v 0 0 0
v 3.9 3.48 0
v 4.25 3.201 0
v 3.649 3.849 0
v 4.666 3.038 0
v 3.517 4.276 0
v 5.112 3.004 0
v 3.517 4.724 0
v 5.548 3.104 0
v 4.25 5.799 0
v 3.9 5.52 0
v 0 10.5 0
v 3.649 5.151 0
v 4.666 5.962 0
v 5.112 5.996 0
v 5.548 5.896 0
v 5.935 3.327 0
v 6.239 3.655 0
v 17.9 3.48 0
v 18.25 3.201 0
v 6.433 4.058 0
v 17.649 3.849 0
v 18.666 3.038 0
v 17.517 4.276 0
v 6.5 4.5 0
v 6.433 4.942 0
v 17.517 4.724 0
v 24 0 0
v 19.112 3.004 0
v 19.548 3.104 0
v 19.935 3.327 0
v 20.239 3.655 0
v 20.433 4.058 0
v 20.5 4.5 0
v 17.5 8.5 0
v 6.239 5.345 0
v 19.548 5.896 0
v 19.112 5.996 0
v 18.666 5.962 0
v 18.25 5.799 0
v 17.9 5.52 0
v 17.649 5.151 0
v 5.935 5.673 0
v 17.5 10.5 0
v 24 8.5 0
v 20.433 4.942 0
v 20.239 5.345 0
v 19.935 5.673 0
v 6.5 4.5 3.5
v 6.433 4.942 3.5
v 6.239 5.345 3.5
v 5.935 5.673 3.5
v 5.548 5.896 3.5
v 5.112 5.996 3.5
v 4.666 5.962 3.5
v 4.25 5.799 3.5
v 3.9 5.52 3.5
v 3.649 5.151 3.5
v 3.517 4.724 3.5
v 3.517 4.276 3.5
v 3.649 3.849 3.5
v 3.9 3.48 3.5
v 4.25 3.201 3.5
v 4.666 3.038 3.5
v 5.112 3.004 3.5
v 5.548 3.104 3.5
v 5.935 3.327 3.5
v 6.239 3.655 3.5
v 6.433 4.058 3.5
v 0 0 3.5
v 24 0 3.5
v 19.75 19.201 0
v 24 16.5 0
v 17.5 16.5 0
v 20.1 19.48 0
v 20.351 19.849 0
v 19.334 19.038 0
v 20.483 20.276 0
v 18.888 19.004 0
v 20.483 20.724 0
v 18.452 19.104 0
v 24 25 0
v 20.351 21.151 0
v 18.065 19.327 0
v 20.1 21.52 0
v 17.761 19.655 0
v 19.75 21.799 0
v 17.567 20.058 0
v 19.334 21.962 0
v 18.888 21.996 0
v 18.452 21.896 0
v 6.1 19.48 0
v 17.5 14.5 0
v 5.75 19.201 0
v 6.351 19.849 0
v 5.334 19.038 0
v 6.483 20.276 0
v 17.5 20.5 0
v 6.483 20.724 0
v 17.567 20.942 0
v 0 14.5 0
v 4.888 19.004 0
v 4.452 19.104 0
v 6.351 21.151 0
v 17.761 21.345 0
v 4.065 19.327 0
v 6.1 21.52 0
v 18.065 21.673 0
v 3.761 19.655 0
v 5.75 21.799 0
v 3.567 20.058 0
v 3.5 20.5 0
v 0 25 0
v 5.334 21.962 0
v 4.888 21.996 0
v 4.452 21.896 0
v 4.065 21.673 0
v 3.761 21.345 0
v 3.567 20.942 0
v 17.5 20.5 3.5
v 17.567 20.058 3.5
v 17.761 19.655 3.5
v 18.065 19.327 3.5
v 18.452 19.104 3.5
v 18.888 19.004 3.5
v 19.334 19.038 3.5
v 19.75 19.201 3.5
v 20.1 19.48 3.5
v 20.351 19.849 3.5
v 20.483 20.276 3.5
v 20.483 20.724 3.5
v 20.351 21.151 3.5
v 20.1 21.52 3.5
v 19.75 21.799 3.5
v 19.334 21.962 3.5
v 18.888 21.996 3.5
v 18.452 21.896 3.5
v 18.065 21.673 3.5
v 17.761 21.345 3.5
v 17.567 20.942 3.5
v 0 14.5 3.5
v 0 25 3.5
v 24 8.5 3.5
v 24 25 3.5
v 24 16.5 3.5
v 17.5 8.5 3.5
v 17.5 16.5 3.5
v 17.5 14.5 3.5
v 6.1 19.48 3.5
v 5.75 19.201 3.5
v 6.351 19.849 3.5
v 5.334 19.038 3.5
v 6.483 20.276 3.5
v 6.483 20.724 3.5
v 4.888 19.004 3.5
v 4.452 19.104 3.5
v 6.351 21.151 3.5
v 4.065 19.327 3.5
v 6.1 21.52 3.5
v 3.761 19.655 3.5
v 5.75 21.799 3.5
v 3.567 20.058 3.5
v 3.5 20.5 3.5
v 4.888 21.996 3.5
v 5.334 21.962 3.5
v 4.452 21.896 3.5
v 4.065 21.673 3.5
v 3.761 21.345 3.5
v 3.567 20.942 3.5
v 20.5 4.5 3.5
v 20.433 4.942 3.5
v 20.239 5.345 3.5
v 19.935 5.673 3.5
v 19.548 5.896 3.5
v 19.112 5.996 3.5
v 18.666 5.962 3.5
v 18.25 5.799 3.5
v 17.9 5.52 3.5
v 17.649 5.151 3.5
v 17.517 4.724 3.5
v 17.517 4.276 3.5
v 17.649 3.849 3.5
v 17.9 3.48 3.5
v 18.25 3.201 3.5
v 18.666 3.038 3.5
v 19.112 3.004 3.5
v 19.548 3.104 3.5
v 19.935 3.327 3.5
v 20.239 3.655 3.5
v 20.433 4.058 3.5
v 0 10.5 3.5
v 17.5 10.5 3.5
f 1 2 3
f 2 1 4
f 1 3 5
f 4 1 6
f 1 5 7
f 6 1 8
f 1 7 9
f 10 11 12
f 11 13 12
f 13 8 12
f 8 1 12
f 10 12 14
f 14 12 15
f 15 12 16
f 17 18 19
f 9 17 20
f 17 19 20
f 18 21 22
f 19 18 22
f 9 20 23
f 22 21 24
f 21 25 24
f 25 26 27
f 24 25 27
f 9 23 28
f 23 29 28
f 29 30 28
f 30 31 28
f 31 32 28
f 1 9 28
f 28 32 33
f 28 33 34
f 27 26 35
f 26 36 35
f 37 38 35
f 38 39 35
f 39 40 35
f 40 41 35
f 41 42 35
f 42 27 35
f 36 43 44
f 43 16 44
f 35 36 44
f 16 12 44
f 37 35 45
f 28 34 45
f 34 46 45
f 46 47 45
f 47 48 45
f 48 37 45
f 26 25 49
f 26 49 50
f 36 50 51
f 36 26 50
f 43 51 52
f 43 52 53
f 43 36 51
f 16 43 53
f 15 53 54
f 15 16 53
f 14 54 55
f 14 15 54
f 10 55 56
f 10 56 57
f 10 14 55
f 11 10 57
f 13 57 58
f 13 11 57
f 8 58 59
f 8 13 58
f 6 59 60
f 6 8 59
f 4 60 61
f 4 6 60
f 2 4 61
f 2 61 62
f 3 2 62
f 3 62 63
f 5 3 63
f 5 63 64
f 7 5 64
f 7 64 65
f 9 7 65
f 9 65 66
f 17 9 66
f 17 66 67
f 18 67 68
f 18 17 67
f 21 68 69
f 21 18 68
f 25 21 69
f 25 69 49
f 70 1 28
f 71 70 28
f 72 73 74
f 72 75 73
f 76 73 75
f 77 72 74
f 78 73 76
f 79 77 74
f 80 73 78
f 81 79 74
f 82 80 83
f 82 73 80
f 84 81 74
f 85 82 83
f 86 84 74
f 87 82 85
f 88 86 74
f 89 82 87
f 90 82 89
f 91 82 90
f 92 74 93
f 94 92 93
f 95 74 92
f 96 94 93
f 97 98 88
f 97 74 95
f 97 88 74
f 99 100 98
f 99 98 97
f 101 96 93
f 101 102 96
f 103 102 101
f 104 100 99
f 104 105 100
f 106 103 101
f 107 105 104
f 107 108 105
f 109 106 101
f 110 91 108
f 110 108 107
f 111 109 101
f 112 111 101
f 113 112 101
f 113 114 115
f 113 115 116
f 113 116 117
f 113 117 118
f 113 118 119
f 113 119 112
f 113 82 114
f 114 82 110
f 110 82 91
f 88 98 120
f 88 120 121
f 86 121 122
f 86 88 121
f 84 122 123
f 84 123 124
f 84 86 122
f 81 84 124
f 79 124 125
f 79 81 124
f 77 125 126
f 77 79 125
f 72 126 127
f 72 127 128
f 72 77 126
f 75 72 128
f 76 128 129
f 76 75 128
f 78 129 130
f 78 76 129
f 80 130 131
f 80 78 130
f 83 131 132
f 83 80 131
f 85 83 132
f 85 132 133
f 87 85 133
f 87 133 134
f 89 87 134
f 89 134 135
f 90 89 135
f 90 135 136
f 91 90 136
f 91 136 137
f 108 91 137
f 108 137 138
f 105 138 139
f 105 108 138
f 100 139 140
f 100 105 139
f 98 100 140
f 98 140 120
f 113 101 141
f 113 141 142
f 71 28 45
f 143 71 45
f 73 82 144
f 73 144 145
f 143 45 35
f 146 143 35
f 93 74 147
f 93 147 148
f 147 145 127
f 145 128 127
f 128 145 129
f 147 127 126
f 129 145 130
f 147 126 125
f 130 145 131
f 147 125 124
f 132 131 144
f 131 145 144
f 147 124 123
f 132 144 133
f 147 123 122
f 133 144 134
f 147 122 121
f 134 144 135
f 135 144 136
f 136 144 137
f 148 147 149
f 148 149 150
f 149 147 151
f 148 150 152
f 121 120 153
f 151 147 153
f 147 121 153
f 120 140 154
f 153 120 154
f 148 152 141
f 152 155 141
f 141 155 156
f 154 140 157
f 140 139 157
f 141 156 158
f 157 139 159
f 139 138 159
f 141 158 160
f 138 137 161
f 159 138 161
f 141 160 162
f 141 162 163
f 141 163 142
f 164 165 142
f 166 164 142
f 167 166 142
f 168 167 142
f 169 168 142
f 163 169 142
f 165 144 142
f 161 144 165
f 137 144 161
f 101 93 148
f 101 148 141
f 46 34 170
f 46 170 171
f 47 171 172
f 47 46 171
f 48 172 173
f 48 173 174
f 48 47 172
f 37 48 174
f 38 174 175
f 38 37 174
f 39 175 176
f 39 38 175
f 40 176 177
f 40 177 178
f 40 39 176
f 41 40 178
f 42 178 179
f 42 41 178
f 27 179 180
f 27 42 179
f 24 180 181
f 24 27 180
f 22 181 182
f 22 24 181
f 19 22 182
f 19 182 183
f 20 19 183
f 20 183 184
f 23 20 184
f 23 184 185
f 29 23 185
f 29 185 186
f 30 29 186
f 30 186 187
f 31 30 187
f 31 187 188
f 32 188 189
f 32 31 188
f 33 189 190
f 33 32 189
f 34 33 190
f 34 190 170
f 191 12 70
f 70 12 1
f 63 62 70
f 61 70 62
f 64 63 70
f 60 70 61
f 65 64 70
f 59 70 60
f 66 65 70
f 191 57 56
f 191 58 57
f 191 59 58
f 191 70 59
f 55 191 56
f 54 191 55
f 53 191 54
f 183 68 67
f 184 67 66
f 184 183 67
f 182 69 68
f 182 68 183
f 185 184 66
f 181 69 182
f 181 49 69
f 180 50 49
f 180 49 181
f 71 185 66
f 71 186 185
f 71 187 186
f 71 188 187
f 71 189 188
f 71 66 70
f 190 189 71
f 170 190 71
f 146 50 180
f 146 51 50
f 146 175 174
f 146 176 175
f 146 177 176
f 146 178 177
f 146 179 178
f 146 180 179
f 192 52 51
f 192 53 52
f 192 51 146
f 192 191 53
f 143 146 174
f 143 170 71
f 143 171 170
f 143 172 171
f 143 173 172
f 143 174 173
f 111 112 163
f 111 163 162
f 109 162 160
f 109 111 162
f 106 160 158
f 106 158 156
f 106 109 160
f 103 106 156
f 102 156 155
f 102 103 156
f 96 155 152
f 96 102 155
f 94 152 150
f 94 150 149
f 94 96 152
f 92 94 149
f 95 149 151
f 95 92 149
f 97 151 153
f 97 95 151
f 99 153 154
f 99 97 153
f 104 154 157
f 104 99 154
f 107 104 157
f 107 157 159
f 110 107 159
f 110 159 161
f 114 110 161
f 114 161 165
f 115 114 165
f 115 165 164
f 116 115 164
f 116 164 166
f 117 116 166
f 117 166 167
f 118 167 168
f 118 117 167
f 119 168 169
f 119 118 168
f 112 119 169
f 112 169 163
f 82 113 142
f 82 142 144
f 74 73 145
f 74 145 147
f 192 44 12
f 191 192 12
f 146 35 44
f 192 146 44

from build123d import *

# Parameters (mm, degrees)
CROQUIS1_R                = 1.5
SALIENTE_EXTRUIR1_DEPTH   = 3.5
SALIENTE_EXTRUIR1_2_DEPTH = 3.5


with BuildPart() as part:
    # Croquis1 → Saliente-Extruir1 (new body)
    with BuildSketch(Plane.XY):
        Polygon((17.5, 8.5), (17.5, 10.5), (0, 10.5), (0, 0), (24, 0), (24, 8.5), align=None)
        with Locations((5, 4.5)):
            Circle(CROQUIS1_R, mode=Mode.SUBTRACT)
        with Locations((19, 4.5)):
            Circle(CROQUIS1_R, mode=Mode.SUBTRACT)
    extrude(amount=SALIENTE_EXTRUIR1_DEPTH)


with BuildPart() as body_2:
    # Croquis1 → Saliente-Extruir1 2 (new body)
    with BuildSketch(Plane.XY):
        Polygon((0, 14.5), (0, 25), (24, 25), (24, 16.5), (17.5, 16.5), (17.5, 14.5), align=None)
        with Locations(Location((19, 20.5, 0), (0, 0, 180))):
            Circle(CROQUIS1_R, mode=Mode.SUBTRACT)
        with Locations(Location((5, 20.5, 0), (0, 0, 180))):
            Circle(CROQUIS1_R, mode=Mode.SUBTRACT)
    extrude(amount=SALIENTE_EXTRUIR1_2_DEPTH)


solid = Compound([part.part, body_2.part])
